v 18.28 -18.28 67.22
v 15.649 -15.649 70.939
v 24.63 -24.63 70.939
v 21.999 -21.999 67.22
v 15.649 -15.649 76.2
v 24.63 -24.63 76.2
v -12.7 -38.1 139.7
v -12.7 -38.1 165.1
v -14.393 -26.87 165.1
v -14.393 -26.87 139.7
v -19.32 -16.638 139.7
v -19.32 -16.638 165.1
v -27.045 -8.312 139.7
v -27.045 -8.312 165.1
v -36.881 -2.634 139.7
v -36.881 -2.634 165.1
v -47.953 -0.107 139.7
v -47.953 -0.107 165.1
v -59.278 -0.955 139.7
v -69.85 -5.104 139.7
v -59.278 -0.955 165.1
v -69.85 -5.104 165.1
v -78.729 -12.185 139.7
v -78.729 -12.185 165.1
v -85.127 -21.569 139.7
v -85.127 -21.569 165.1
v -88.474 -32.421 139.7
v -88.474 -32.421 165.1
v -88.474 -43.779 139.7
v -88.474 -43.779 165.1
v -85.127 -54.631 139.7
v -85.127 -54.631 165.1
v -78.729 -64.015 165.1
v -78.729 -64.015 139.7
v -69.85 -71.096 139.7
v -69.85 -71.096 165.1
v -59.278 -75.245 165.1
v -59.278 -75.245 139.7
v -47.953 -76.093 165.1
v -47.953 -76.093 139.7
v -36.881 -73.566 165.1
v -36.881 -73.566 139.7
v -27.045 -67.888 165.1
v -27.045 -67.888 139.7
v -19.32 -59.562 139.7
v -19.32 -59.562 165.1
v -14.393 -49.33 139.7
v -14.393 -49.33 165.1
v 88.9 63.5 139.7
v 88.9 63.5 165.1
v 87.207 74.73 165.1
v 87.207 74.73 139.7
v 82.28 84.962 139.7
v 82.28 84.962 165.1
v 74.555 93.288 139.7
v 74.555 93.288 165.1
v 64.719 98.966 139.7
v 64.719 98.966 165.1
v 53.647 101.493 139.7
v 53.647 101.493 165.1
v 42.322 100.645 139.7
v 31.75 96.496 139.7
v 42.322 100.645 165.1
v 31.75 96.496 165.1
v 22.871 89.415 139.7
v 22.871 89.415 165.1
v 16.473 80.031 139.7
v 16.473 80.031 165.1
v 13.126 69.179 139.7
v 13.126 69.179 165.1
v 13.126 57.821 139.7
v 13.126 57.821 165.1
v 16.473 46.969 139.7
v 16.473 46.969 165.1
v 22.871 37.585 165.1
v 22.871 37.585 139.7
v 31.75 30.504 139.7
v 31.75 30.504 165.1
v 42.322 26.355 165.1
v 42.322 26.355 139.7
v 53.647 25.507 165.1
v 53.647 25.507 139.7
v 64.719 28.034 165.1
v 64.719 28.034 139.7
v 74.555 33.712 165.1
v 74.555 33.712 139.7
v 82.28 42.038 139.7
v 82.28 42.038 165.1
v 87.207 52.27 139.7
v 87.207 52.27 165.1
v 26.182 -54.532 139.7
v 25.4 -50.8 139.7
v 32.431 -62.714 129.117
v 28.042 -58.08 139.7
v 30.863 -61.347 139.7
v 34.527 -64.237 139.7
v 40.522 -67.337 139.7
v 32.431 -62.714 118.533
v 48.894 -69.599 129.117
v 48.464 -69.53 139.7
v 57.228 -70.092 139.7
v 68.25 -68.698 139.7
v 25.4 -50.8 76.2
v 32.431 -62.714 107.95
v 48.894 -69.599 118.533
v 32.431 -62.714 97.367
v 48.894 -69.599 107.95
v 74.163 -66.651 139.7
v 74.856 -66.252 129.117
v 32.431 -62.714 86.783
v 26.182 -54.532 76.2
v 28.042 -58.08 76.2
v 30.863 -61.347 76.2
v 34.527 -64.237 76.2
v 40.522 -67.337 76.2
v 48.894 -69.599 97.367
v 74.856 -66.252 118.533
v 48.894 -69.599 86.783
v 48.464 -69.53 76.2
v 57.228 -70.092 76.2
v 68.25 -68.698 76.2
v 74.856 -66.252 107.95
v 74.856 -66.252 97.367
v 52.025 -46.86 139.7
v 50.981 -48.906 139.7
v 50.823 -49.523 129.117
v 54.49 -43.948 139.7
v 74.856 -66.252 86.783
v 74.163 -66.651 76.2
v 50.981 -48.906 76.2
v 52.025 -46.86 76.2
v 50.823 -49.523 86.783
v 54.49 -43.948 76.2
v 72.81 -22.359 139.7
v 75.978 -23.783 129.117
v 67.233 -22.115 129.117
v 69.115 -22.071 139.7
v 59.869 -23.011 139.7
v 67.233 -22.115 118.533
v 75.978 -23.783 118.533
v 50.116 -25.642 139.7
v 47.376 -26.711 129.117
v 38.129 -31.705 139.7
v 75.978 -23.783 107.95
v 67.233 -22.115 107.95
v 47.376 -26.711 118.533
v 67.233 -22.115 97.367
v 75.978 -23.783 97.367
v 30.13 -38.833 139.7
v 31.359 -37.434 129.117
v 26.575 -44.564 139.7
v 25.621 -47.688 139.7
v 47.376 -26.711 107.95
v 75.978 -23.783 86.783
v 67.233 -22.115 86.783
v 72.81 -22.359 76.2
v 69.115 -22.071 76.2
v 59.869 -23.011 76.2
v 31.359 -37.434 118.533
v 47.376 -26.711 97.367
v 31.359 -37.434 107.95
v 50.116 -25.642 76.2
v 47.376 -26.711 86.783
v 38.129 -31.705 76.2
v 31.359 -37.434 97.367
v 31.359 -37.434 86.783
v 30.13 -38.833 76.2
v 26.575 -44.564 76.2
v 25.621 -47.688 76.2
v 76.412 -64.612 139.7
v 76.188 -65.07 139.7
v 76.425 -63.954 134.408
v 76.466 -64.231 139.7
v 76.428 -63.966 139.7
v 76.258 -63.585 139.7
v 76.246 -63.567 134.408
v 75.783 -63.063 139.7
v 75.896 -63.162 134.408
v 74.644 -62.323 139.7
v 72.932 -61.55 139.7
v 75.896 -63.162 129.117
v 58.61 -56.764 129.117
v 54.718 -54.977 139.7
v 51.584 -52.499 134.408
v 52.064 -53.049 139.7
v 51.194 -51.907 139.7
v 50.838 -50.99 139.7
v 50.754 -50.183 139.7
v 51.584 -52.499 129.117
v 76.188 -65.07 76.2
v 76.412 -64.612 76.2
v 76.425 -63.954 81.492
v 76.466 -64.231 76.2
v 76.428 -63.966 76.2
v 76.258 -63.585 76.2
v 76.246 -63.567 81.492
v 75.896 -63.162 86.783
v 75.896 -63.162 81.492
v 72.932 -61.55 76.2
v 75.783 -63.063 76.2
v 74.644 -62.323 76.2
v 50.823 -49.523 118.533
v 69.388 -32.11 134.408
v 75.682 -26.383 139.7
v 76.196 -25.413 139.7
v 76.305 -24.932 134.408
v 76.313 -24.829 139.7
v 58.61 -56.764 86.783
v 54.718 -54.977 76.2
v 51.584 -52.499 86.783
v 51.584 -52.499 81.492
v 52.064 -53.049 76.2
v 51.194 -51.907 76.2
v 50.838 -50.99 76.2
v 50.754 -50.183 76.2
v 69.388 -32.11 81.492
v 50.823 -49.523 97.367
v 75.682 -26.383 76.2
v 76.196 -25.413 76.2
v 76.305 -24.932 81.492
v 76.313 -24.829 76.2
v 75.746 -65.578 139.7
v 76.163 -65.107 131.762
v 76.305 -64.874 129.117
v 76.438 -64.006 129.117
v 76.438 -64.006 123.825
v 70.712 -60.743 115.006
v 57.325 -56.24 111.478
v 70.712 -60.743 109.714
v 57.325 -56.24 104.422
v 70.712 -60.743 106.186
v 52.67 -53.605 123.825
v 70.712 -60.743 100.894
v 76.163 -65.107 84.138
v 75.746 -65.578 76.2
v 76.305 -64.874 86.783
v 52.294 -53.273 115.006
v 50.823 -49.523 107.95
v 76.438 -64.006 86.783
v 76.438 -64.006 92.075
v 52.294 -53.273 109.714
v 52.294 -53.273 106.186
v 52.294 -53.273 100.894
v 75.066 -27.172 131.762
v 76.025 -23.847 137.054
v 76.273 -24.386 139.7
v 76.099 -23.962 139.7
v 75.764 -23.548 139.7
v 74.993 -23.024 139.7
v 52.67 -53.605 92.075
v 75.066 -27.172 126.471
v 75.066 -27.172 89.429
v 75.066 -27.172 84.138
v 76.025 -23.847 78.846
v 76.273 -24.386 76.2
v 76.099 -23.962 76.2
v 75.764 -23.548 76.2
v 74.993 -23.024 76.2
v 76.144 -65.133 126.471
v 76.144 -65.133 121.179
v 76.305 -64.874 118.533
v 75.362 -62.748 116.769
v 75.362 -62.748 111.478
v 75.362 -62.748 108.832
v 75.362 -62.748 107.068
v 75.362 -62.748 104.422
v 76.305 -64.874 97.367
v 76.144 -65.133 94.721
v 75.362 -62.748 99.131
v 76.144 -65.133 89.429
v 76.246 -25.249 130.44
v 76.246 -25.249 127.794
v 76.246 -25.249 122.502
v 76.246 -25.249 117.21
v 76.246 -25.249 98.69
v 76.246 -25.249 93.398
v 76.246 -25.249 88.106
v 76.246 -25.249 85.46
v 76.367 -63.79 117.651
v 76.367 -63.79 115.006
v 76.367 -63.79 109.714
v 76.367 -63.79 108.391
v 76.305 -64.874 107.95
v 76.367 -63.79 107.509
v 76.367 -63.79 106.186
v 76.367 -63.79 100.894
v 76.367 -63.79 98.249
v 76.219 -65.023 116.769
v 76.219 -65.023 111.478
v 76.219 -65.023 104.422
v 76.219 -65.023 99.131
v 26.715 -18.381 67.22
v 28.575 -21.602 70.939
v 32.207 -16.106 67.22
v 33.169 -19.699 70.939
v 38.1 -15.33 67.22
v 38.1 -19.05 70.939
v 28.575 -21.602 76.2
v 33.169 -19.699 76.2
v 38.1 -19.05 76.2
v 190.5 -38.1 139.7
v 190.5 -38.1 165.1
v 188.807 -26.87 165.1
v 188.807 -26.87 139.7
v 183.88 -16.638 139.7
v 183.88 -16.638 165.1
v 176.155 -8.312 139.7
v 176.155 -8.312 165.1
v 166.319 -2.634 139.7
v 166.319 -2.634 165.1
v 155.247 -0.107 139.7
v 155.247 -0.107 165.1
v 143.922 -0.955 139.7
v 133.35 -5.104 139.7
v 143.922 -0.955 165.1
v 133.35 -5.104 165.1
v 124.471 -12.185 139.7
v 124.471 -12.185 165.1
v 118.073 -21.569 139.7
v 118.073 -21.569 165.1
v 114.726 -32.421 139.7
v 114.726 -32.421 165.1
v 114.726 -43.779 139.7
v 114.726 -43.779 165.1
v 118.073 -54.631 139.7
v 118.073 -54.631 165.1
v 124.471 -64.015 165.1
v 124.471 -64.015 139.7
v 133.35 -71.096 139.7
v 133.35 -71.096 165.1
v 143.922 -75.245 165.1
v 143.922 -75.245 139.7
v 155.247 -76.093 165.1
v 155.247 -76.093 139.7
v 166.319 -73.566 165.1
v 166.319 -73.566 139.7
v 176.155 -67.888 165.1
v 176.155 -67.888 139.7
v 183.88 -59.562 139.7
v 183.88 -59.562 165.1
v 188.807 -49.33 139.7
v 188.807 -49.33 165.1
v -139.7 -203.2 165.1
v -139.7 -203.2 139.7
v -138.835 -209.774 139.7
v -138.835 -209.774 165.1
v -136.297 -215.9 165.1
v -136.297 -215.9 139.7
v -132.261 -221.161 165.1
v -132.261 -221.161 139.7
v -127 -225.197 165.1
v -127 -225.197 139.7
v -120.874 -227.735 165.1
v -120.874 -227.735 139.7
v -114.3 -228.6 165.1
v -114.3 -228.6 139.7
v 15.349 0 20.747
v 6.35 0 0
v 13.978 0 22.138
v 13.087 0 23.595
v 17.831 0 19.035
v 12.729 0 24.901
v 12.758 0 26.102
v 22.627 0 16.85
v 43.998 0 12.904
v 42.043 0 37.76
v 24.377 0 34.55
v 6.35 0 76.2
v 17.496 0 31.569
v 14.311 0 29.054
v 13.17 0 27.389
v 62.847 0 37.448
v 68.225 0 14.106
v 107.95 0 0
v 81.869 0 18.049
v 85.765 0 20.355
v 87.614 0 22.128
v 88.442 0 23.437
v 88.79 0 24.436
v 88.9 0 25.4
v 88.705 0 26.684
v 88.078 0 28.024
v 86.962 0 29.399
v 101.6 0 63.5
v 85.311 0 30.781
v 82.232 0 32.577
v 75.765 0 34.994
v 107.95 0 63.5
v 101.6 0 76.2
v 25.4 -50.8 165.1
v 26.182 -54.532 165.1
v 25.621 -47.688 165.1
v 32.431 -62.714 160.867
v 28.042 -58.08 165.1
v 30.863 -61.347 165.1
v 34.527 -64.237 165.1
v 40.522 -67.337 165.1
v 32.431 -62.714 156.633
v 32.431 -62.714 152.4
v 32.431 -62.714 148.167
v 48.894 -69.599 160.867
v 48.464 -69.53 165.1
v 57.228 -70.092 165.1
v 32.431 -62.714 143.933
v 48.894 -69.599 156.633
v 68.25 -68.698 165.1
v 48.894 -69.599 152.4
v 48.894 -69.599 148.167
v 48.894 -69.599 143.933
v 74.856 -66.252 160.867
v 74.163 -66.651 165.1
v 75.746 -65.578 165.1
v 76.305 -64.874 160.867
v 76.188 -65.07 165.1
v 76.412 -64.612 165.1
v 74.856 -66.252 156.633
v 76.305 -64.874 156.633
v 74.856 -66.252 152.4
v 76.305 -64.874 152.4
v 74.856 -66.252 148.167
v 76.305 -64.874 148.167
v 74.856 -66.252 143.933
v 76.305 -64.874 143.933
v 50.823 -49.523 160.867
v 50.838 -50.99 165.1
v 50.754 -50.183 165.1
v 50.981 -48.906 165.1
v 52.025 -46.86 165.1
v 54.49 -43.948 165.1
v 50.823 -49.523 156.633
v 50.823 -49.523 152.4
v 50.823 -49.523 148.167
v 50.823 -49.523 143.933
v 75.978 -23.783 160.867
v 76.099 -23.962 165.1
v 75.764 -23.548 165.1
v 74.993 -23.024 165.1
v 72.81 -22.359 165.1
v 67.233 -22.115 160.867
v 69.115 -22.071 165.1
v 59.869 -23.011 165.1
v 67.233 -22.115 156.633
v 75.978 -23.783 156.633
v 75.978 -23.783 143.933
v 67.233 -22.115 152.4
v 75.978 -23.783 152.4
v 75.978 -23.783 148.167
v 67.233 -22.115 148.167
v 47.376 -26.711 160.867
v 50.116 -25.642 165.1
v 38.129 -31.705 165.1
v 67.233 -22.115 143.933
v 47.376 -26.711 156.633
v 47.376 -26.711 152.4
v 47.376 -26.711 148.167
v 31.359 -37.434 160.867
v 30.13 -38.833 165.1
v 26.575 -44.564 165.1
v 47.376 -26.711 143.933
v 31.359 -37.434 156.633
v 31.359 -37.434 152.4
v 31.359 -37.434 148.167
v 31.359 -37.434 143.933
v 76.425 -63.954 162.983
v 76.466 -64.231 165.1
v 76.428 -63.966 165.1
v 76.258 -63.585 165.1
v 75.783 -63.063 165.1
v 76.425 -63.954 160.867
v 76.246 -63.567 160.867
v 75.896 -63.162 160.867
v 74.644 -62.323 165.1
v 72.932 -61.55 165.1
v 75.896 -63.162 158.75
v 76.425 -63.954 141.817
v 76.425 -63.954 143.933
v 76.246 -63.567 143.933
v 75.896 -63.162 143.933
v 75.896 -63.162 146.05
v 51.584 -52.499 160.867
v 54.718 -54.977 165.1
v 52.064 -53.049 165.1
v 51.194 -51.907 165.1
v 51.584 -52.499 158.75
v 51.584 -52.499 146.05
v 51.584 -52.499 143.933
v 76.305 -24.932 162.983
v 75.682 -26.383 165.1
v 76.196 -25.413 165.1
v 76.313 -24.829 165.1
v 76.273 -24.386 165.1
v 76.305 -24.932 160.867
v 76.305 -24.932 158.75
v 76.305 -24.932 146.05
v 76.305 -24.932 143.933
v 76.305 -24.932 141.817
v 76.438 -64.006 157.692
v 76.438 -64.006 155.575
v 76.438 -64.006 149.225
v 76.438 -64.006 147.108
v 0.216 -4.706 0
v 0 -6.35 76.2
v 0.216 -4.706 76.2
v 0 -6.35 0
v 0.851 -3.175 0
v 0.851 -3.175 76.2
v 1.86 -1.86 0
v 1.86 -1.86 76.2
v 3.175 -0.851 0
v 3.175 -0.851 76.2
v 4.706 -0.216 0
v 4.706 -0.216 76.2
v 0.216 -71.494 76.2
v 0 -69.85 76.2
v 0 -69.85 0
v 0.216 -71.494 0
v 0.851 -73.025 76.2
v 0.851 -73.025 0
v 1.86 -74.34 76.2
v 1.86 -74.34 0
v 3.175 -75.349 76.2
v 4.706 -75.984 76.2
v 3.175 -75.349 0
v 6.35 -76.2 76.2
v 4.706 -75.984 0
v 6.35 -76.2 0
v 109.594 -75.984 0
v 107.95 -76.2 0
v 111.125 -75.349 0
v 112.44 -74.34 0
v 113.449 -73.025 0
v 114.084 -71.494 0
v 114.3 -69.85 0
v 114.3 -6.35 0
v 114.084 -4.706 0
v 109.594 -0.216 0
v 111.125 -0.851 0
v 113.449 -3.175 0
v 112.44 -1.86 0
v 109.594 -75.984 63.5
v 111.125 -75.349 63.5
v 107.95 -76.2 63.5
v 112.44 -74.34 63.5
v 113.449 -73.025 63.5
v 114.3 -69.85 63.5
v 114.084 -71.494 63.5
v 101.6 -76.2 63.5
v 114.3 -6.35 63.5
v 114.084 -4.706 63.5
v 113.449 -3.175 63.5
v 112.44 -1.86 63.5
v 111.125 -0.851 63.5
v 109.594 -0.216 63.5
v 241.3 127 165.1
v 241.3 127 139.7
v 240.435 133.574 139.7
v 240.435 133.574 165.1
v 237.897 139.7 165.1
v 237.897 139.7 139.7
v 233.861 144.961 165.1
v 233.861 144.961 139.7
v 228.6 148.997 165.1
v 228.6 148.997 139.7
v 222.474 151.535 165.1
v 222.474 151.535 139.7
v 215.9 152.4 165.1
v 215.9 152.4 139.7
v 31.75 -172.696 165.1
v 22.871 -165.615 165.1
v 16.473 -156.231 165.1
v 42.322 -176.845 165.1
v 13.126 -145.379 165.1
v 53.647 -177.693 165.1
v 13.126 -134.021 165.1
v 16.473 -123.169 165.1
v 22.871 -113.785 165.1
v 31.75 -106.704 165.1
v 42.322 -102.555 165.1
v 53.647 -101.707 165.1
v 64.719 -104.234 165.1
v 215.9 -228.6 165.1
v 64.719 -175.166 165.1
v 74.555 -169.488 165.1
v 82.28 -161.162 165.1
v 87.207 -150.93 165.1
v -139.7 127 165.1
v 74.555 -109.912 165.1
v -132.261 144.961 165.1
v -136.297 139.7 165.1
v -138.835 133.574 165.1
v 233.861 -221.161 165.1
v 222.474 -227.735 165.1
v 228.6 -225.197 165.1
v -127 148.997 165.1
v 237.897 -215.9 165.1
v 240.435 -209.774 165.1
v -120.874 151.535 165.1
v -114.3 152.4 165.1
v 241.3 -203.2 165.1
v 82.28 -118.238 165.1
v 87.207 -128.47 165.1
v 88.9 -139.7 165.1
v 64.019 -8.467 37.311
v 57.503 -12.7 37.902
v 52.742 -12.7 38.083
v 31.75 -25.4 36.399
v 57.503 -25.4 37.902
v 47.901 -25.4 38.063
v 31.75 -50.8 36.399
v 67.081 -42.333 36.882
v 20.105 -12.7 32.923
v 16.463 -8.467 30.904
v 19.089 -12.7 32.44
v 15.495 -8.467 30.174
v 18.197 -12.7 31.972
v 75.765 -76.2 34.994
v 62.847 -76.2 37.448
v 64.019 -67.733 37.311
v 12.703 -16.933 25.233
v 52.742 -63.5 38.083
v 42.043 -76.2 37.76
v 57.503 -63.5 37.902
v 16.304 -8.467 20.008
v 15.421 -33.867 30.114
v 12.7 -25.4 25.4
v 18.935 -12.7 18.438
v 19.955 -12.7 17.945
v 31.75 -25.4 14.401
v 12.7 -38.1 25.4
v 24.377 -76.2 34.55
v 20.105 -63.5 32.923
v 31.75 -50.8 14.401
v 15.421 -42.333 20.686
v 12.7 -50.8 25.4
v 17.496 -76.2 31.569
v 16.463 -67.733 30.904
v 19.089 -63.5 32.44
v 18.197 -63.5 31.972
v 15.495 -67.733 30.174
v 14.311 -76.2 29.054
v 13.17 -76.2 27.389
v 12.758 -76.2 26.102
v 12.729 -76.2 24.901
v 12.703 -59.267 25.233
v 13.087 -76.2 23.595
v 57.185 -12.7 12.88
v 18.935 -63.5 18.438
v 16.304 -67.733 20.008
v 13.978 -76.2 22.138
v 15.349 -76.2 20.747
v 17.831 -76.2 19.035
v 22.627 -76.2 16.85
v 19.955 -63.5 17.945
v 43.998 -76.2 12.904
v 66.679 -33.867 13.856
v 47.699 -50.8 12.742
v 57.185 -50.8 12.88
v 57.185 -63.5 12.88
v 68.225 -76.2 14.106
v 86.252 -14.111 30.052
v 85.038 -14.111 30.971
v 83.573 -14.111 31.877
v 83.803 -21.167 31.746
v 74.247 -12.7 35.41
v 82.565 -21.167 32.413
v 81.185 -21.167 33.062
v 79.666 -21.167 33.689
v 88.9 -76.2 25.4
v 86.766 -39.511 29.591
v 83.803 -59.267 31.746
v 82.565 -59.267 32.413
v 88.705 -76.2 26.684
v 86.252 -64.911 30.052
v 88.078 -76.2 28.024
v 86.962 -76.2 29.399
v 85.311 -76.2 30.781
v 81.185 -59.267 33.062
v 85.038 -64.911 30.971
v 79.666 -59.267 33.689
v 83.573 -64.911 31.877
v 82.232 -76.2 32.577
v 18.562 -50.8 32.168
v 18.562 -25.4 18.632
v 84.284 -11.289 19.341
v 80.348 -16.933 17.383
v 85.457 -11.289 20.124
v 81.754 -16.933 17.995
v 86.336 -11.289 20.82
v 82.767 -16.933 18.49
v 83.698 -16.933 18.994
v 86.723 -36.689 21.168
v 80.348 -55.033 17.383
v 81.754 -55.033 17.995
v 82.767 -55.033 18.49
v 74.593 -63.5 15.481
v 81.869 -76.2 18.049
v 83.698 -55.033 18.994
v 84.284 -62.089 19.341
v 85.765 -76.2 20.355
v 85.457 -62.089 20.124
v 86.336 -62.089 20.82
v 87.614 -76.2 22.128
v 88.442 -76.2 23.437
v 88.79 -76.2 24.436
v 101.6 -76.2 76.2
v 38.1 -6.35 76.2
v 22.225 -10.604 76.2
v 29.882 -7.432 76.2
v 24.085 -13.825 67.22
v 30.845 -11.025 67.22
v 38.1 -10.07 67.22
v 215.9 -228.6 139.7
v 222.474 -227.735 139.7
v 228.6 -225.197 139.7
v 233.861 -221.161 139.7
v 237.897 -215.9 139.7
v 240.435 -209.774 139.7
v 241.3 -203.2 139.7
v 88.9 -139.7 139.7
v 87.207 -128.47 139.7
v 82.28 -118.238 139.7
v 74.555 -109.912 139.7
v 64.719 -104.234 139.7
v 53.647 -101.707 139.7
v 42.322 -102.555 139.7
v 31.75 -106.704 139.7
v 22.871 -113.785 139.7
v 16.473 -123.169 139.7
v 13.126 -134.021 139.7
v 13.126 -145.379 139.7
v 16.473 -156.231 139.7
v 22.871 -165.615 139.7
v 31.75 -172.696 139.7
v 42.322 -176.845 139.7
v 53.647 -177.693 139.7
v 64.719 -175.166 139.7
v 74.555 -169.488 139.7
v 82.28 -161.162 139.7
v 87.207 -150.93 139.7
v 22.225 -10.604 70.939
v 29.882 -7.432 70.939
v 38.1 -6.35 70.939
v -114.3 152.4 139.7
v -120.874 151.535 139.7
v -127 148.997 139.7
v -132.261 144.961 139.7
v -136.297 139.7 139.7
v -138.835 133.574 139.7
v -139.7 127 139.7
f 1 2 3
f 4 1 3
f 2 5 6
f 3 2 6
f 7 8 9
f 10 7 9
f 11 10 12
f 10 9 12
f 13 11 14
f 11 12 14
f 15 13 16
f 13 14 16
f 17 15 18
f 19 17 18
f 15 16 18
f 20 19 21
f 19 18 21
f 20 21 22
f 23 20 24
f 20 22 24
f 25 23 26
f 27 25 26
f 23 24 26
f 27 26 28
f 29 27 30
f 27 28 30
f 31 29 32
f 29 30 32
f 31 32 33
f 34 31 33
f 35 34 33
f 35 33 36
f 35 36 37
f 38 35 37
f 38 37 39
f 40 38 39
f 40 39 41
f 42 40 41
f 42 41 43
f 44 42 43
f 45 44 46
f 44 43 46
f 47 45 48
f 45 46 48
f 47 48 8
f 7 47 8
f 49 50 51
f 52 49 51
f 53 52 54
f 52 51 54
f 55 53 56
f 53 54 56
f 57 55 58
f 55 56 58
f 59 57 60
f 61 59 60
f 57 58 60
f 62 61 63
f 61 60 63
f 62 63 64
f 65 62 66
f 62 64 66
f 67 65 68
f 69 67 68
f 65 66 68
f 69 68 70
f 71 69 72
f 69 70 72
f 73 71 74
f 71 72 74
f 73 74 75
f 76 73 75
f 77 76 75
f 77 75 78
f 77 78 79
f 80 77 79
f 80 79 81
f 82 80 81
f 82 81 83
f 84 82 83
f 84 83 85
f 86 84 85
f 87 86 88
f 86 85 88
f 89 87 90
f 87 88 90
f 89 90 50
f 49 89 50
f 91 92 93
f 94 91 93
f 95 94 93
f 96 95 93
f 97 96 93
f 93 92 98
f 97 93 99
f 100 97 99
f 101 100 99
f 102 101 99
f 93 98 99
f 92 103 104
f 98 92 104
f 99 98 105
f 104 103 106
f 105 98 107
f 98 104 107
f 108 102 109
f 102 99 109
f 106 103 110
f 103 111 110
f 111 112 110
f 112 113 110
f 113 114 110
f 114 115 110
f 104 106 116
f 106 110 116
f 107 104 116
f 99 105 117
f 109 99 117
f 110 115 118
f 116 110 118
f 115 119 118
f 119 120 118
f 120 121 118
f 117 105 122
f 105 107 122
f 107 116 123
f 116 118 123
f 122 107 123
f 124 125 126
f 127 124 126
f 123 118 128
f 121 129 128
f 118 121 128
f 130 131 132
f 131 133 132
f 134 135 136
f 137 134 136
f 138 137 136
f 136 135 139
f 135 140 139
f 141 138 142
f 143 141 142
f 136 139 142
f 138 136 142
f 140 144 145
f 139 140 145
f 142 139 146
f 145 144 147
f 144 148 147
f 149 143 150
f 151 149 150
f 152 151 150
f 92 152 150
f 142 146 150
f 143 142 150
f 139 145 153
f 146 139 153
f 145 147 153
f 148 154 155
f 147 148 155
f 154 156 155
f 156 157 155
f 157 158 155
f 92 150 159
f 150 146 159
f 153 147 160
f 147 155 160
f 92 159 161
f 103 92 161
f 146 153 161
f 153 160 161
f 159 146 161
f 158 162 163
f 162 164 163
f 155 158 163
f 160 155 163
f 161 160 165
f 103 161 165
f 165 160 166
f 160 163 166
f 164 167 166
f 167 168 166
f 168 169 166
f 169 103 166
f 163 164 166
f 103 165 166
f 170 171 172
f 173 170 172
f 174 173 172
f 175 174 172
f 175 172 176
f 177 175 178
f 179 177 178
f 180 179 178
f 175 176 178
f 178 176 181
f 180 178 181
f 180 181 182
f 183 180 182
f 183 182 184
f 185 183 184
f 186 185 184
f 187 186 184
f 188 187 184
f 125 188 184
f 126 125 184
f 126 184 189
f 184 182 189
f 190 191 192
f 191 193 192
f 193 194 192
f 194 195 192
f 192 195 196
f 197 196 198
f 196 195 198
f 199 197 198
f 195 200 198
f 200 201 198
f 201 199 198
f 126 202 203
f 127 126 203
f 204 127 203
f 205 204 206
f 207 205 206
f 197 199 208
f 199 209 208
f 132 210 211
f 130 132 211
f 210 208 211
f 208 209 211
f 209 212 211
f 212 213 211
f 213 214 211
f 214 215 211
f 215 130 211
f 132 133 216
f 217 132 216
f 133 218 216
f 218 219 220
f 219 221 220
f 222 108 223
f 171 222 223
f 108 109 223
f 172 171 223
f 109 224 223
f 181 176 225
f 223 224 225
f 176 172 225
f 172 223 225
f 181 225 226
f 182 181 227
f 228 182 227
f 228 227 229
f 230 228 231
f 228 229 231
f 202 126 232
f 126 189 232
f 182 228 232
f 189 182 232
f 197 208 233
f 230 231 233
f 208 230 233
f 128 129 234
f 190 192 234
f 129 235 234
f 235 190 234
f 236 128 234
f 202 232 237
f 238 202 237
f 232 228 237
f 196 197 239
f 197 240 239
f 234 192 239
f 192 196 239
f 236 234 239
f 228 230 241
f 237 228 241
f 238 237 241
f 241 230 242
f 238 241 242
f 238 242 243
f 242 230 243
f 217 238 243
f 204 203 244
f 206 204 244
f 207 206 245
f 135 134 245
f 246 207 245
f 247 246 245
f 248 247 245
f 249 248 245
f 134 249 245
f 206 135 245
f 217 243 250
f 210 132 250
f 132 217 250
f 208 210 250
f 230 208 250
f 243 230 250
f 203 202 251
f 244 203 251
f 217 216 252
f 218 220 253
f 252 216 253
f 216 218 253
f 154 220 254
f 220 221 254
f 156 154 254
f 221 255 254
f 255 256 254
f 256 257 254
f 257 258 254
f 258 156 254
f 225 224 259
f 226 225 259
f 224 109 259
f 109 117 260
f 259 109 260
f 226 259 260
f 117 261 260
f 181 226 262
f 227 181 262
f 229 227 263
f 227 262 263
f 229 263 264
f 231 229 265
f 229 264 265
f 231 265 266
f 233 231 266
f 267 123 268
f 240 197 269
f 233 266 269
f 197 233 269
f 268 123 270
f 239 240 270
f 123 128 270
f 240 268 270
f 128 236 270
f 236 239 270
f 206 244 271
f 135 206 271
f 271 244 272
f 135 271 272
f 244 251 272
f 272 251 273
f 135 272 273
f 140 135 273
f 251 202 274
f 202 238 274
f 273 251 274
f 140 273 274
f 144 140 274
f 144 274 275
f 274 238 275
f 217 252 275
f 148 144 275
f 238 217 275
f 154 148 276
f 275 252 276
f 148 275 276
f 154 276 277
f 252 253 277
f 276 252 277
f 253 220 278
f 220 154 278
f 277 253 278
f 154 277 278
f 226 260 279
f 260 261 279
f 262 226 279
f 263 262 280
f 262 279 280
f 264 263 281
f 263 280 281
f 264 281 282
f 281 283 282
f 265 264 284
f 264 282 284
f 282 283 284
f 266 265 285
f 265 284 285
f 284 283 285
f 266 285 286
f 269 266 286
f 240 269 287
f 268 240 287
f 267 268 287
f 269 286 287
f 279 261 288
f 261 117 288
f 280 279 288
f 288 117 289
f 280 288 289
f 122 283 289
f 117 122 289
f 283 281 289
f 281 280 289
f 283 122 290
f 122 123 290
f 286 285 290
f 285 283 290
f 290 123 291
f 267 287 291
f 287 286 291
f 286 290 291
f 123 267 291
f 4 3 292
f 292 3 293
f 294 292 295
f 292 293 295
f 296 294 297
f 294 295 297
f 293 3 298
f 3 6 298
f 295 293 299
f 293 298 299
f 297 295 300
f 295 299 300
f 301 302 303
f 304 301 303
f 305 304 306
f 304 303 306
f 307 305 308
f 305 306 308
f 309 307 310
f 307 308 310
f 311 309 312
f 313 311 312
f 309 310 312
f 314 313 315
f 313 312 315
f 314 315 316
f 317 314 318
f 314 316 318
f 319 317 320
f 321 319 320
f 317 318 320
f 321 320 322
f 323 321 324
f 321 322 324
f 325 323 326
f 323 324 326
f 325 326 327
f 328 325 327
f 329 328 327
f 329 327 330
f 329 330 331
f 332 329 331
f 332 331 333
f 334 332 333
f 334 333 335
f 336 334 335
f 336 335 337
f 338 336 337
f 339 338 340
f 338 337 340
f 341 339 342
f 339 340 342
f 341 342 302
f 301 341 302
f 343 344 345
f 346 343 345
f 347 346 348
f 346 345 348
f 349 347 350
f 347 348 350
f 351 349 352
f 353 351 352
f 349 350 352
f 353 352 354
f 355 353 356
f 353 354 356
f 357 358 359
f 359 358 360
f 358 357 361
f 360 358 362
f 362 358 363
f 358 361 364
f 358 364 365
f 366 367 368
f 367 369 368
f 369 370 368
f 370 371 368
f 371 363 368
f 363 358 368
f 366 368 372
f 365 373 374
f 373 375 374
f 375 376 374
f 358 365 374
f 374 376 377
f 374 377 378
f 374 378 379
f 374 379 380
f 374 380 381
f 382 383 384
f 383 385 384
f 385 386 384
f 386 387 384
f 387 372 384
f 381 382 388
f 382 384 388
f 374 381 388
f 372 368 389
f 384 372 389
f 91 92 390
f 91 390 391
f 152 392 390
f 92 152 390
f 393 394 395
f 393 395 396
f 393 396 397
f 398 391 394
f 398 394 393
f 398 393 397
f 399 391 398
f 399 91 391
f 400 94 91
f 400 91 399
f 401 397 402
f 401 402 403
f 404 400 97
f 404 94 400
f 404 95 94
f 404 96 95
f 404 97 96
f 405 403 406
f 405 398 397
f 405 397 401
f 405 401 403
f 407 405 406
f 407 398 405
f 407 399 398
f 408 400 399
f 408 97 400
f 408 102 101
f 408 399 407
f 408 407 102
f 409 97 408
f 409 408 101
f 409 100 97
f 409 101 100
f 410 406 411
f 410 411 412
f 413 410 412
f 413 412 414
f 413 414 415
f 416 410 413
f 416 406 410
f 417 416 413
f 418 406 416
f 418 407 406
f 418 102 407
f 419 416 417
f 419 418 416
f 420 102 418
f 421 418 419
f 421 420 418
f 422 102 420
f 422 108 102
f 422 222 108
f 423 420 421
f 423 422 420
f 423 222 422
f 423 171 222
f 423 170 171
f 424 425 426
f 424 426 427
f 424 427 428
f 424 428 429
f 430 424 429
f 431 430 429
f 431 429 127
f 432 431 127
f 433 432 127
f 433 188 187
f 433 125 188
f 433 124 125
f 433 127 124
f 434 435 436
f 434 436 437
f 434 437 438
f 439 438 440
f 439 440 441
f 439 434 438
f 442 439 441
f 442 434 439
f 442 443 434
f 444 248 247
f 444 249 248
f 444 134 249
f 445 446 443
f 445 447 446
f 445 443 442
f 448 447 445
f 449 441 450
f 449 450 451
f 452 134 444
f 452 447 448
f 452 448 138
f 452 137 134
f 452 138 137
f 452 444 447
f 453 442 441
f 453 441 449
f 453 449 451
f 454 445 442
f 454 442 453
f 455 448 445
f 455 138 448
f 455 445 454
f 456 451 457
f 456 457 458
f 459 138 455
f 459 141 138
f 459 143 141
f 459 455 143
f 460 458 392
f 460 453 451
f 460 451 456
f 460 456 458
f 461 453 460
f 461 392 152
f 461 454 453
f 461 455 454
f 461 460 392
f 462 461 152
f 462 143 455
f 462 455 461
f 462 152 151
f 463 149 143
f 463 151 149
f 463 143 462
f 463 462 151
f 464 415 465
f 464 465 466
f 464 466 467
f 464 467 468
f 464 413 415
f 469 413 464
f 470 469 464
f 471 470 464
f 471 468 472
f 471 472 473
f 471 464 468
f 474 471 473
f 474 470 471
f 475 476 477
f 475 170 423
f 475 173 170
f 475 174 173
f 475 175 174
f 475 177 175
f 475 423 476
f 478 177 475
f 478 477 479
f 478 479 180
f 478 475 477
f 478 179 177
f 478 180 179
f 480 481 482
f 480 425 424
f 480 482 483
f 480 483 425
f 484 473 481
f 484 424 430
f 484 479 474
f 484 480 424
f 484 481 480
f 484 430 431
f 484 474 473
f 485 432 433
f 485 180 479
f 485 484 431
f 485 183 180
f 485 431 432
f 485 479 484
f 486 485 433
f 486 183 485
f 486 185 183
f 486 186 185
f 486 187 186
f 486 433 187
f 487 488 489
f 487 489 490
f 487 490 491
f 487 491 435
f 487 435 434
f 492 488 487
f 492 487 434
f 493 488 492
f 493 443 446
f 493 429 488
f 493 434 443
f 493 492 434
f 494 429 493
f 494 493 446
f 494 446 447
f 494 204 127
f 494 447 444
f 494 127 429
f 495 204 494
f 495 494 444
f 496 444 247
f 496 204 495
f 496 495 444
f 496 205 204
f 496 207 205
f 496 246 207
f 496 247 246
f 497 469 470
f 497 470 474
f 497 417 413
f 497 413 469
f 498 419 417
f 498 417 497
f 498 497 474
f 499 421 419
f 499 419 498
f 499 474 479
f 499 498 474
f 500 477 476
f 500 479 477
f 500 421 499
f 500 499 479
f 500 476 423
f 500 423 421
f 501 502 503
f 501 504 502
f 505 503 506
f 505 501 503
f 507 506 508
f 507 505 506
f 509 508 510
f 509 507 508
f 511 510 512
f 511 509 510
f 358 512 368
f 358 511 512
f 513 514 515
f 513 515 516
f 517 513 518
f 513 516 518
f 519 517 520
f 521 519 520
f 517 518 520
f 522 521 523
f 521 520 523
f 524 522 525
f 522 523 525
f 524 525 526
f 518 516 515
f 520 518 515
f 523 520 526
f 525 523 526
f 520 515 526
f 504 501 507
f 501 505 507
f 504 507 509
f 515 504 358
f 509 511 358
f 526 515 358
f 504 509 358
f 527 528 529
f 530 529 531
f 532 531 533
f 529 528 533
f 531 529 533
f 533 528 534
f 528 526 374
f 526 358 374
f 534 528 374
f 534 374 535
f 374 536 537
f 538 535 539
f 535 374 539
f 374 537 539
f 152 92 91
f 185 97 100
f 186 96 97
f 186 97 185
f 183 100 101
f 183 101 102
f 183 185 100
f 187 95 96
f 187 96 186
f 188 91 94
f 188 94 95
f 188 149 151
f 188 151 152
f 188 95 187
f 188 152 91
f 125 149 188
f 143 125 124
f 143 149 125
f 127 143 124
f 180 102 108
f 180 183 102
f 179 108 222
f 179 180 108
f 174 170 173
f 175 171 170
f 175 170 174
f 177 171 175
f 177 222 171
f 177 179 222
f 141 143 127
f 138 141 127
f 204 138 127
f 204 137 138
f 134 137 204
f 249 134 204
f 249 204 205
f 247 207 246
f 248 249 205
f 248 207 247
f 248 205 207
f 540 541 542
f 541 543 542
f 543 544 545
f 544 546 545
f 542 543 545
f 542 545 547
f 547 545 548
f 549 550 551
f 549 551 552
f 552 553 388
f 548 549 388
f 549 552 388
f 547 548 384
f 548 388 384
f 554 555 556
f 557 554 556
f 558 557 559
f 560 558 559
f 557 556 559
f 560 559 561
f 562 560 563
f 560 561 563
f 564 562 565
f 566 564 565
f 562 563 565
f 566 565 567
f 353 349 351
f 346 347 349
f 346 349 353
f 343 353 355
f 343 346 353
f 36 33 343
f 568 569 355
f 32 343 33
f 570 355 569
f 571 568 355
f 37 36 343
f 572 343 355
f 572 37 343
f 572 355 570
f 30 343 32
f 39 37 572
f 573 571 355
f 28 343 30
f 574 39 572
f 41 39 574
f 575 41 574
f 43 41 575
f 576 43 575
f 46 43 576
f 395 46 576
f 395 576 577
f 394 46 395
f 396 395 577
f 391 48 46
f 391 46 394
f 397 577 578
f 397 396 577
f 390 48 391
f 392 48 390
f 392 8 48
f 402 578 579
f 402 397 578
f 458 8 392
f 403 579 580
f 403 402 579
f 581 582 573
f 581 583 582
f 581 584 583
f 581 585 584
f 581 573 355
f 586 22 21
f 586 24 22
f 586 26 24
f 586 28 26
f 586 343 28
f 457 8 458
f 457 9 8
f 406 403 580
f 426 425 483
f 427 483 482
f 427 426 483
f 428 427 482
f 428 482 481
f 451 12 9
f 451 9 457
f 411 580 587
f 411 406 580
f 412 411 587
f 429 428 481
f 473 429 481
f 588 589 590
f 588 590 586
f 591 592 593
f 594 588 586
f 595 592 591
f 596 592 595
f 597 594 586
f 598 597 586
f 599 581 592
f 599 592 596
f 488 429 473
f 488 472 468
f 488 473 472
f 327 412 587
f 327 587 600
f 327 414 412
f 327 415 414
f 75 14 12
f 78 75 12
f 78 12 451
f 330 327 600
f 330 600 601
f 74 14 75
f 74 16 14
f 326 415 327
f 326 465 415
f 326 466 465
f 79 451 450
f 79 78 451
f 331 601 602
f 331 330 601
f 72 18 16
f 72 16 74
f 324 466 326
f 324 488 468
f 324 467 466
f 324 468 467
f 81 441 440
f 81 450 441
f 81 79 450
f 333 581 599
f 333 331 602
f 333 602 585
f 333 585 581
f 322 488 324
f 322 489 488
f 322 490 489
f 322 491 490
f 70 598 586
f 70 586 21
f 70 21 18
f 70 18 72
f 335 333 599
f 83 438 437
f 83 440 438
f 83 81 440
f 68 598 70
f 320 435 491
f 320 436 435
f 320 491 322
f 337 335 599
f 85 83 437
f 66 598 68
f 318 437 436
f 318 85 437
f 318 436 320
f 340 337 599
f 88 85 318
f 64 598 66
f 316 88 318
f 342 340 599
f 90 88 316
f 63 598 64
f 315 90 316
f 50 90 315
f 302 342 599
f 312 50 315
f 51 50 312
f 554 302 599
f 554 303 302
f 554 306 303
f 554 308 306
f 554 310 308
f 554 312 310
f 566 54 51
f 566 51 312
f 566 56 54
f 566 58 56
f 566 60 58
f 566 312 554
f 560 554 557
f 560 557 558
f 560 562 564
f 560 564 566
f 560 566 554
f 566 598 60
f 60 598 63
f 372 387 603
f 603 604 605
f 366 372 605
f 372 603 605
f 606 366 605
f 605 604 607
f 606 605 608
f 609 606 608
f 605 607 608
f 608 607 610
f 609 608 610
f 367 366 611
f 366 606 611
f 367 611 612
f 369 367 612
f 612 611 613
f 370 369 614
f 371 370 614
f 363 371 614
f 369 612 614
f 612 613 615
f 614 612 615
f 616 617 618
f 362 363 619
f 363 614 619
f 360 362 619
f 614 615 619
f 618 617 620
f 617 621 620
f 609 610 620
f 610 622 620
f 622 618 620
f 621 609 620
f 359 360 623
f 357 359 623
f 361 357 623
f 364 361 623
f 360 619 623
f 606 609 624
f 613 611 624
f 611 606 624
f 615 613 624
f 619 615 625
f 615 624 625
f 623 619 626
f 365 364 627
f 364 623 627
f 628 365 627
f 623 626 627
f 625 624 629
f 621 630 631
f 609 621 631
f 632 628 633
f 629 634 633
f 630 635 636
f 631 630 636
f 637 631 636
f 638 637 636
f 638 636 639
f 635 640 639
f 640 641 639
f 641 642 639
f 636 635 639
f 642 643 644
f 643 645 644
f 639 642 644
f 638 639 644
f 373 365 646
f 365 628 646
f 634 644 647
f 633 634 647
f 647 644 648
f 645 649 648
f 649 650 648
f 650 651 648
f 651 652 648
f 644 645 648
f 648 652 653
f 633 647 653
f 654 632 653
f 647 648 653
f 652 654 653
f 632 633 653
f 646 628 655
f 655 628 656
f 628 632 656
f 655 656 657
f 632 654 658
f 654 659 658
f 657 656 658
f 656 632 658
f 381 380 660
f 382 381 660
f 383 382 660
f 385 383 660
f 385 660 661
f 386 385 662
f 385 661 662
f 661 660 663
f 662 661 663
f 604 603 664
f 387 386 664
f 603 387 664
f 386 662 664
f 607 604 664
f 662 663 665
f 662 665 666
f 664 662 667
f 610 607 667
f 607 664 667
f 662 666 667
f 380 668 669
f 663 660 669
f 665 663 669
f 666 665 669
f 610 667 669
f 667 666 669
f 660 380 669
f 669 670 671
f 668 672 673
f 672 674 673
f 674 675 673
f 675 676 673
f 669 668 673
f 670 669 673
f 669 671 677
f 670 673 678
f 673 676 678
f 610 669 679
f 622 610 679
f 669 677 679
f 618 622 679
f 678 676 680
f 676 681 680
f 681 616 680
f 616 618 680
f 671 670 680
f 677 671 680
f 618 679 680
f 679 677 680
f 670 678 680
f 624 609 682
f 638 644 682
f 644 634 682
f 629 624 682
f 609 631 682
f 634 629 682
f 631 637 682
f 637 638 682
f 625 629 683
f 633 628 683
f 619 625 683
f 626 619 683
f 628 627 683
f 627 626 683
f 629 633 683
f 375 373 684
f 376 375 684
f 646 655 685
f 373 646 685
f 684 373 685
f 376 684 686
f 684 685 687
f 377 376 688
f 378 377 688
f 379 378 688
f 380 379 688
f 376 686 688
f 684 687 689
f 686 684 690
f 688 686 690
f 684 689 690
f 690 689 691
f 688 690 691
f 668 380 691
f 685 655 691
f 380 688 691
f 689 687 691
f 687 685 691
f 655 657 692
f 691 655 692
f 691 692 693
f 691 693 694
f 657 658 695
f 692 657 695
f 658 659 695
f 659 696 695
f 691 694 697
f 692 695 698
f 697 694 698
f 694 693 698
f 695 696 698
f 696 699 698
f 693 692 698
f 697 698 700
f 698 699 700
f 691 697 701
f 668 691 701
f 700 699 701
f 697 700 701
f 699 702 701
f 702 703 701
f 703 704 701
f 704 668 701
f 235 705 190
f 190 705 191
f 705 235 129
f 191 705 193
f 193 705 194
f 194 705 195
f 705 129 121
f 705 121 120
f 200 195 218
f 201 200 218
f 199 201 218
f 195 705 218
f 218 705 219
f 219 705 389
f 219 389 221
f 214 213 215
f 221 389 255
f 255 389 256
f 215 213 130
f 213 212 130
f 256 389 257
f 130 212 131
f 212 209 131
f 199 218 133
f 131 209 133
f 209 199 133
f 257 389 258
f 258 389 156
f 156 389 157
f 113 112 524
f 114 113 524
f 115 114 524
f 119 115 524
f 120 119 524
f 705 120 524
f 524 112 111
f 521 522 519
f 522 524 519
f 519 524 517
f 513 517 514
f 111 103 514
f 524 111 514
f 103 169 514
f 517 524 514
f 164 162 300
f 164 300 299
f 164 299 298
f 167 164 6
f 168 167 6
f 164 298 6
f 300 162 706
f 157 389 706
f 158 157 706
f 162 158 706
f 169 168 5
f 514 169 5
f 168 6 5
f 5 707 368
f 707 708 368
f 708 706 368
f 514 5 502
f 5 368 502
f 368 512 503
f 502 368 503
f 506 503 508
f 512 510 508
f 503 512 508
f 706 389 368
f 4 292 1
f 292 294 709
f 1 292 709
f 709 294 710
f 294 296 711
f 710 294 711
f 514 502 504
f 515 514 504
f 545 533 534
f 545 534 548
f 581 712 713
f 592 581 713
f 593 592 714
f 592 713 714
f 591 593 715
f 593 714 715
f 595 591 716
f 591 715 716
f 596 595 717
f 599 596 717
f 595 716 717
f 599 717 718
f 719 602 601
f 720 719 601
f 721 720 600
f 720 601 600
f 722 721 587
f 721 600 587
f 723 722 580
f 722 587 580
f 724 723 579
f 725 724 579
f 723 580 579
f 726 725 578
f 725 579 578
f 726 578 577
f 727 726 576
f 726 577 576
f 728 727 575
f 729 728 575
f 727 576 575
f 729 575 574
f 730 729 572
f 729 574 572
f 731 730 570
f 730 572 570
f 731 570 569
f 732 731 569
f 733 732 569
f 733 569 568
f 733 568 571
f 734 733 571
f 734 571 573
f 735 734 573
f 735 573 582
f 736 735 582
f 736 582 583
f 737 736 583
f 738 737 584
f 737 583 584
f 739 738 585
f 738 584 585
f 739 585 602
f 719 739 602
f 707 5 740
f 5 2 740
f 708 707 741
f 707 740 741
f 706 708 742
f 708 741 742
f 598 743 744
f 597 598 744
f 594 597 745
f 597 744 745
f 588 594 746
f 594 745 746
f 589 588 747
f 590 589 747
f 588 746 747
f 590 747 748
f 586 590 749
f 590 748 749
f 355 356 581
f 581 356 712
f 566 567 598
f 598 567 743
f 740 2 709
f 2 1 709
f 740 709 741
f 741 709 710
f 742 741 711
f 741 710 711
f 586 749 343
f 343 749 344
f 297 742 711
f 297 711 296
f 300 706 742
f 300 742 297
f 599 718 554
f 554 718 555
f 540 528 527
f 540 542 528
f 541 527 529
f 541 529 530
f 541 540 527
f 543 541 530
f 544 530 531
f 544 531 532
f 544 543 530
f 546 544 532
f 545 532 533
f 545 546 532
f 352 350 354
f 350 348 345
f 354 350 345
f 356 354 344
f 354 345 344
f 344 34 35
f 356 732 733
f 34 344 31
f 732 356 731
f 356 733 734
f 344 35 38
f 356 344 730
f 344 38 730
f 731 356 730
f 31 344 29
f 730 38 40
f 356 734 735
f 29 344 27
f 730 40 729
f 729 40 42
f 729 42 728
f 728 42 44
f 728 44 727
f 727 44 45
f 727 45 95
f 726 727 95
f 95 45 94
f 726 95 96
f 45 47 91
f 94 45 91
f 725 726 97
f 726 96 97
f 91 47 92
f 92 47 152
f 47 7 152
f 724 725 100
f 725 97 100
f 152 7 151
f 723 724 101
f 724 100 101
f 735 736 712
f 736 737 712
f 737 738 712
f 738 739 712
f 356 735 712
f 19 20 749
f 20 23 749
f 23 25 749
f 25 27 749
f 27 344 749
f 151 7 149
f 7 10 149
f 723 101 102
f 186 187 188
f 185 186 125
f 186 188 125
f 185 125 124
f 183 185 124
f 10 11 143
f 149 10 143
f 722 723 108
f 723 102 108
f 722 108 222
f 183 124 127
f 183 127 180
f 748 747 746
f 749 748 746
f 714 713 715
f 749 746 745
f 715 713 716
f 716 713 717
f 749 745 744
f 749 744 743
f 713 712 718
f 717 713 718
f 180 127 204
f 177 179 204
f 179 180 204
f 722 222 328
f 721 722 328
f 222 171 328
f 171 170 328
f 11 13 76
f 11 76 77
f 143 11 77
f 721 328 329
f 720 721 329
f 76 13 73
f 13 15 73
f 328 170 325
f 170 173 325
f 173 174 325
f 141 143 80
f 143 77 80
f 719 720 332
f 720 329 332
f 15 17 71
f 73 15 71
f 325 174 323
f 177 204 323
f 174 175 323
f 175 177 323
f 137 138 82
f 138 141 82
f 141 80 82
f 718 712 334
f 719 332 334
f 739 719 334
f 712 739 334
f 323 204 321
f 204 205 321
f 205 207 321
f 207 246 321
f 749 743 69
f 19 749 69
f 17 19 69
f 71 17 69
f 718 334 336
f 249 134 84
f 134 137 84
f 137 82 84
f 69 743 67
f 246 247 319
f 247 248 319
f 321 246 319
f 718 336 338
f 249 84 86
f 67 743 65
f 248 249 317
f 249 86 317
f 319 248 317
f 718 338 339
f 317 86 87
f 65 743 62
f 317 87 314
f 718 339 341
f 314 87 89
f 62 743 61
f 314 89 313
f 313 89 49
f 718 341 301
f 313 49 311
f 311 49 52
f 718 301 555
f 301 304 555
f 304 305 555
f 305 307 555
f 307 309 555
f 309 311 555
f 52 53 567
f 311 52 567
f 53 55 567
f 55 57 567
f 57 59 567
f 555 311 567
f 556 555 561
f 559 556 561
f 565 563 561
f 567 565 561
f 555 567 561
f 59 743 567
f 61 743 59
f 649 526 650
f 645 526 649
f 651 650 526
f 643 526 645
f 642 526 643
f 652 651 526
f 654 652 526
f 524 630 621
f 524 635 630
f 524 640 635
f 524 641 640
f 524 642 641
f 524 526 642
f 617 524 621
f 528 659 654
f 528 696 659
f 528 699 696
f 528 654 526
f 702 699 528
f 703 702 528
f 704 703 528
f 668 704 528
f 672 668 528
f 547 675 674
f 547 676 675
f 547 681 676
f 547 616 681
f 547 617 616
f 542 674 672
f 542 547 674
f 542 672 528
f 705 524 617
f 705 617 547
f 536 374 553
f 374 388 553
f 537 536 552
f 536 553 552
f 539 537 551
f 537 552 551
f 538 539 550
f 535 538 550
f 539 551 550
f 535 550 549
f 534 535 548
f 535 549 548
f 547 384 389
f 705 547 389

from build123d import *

# Parameters (mm, degrees)
F1_DEPTH       = 76.2
F3_DEPTH       = 76.2
F6_ANGLE_START = 45
F6_ANGLE       = 45
F8_DEPTH       = 63.5
F9_R           = 6.35
F11_DEPTH      = 25.4
F12_R          = 38.1
F13_DEPTH      = 25.4


with BuildPart() as f1:
    # F0 (on Front) → F1 (new body)
    with BuildSketch(Plane.XZ):
        Polygon((0, 76.2), (0, 0), (88.8306446588, 0), (101.6, 0), (114.3, 0), (114.3, 63.5), (101.6, 63.5), (101.6, 76.2), align=None)
    extrude(amount=F1_DEPTH)

    # F2 (on face) → F3 (cut, through all)
    with BuildSketch(Plane.XZ.offset(76.2)):
        with BuildLine():
            add(Edge.make_bspline(
                [(88.9, 25.4), (88.9, 47.3970452561), (31.75, 36.3985226281), (-25.4, 25.4), (31.75, 14.4014773719), (88.9, 3.4029547439), (88.9, 25.4)],
                knots=[0, 0, 0, 2.0943951024, 2.0943951024, 4.1887902048, 4.1887902048, 6.2831853072, 6.2831853072, 6.2831853072], degree=2, weights=[1, 0.5, 1, 0.5, 1, 0.5, 1]))
        make_face()
    extrude(amount=-F3_DEPTH, mode=Mode.SUBTRACT)

    # F5 (on offset) → F6 (revolve, cut)
    with BuildSketch(Plane.XZ.offset(38.1), mode=Mode.PRIVATE) as f6_sk:
        Polygon((6.35, 76.2), (6.35, 70.9394877579), (10.0697438789, 67.2197438789), (15.3302561211, 67.2197438789), (19.05, 70.9394877579), (19.05, 76.2), (15.3302561211, 79.9197438789), (10.0697438789, 79.9197438789), align=None)
    revolve(f6_sk.sketch.rotate(Axis((38.1, -38.1, 38.1), (0, 0, -1)), F6_ANGLE_START), axis=Axis((38.1, -38.1, 38.1), (0, 0, -1)), revolution_arc=F6_ANGLE, mode=Mode.SUBTRACT)

    # F7 (on face) → F8 (join)
    with BuildSketch(Plane.XY.offset(76.2)):
        with BuildLine():
            add(Edge.make_bspline(
                [(25.4, -50.8), (25.8926511047, -59.9529854849), (46.7650224338, -75.9649959371), (94.4797043393, -62.4150130403), (27.4951811657, -54.5063585346), (95.1955241162, -20.3703637934), (45.668122068, -21.5563633126), (24.8759871302, -41.0643429702), (25.4, -50.8)],
                knots=[0, 0, 0, 0, 0.1701961468, 0.3247489732, 0.4857105509, 0.6667412447, 0.8189693062, 1, 1, 1, 1], degree=3))
        make_face()
    extrude(amount=F8_DEPTH)

    # F9
    f9_edges = [f1.edges().sort_by_distance(p)[0] for p in [
        (0, -76.2, 38.1),
        (0, 0, 38.1),
        (114.3, -76.2, 31.75),
        (114.3, 0, 31.75),
    ]]
    fillet(f9_edges, radius=F9_R)


with BuildPart() as f11:
    # F10 (on face) → F11 (new body)
    with BuildSketch(Plane.XY.offset(139.7)):
        with BuildLine():
            Line((215.9, 152.4), (-114.3, 152.4))
            ThreePointArc((-114.3, 152.4), (-132.2605122421, 144.9605122421), (-139.7, 127))
            Line((-139.7, 127), (-139.7, -203.2))
            ThreePointArc((-139.7, -203.2), (-132.2605122421, -221.1605122421), (-114.3, -228.6))
            Line((-114.3, -228.6), (215.9, -228.6))
            ThreePointArc((215.9, -228.6), (233.8605122421, -221.1605122421), (241.3, -203.2))
            Line((241.3, -203.2), (241.3, 127))
            ThreePointArc((241.3, 127), (233.8605122421, 144.9605122421), (215.9, 152.4))
        make_face()
        with BuildLine():
            add(Edge.make_bspline(
                [(25.4, -50.8), (25.8926511047, -59.9529854849), (46.7650224338, -75.9649959371), (94.4797043393, -62.4150130403), (27.4951811657, -54.5063585346), (95.1955241162, -20.3703637934), (45.668122068, -21.5563633126), (24.8759871302, -41.0643429702), (25.4, -50.8)],
                knots=[0, 0, 0, 0, 0.1701961468, 0.3247489732, 0.4857105509, 0.6667412447, 0.8189693062, 1, 1, 1, 1], degree=3))
        make_face(mode=Mode.SUBTRACT)
    extrude(amount=F11_DEPTH)

    # F12 (on face) → F13 (cut, through all)
    with BuildSketch(Plane.XY.offset(165.1)):
        with Locations((-50.8, -38.1)):
            Circle(F12_R)
        with Locations((50.8, -139.7)):
            Circle(F12_R)
        with Locations((152.4, -38.1)):
            Circle(F12_R)
        with Locations((50.8, 63.5)):
            Circle(F12_R)
    extrude(amount=-F13_DEPTH, mode=Mode.SUBTRACT)


solid = Compound([f1.part, f11.part])
